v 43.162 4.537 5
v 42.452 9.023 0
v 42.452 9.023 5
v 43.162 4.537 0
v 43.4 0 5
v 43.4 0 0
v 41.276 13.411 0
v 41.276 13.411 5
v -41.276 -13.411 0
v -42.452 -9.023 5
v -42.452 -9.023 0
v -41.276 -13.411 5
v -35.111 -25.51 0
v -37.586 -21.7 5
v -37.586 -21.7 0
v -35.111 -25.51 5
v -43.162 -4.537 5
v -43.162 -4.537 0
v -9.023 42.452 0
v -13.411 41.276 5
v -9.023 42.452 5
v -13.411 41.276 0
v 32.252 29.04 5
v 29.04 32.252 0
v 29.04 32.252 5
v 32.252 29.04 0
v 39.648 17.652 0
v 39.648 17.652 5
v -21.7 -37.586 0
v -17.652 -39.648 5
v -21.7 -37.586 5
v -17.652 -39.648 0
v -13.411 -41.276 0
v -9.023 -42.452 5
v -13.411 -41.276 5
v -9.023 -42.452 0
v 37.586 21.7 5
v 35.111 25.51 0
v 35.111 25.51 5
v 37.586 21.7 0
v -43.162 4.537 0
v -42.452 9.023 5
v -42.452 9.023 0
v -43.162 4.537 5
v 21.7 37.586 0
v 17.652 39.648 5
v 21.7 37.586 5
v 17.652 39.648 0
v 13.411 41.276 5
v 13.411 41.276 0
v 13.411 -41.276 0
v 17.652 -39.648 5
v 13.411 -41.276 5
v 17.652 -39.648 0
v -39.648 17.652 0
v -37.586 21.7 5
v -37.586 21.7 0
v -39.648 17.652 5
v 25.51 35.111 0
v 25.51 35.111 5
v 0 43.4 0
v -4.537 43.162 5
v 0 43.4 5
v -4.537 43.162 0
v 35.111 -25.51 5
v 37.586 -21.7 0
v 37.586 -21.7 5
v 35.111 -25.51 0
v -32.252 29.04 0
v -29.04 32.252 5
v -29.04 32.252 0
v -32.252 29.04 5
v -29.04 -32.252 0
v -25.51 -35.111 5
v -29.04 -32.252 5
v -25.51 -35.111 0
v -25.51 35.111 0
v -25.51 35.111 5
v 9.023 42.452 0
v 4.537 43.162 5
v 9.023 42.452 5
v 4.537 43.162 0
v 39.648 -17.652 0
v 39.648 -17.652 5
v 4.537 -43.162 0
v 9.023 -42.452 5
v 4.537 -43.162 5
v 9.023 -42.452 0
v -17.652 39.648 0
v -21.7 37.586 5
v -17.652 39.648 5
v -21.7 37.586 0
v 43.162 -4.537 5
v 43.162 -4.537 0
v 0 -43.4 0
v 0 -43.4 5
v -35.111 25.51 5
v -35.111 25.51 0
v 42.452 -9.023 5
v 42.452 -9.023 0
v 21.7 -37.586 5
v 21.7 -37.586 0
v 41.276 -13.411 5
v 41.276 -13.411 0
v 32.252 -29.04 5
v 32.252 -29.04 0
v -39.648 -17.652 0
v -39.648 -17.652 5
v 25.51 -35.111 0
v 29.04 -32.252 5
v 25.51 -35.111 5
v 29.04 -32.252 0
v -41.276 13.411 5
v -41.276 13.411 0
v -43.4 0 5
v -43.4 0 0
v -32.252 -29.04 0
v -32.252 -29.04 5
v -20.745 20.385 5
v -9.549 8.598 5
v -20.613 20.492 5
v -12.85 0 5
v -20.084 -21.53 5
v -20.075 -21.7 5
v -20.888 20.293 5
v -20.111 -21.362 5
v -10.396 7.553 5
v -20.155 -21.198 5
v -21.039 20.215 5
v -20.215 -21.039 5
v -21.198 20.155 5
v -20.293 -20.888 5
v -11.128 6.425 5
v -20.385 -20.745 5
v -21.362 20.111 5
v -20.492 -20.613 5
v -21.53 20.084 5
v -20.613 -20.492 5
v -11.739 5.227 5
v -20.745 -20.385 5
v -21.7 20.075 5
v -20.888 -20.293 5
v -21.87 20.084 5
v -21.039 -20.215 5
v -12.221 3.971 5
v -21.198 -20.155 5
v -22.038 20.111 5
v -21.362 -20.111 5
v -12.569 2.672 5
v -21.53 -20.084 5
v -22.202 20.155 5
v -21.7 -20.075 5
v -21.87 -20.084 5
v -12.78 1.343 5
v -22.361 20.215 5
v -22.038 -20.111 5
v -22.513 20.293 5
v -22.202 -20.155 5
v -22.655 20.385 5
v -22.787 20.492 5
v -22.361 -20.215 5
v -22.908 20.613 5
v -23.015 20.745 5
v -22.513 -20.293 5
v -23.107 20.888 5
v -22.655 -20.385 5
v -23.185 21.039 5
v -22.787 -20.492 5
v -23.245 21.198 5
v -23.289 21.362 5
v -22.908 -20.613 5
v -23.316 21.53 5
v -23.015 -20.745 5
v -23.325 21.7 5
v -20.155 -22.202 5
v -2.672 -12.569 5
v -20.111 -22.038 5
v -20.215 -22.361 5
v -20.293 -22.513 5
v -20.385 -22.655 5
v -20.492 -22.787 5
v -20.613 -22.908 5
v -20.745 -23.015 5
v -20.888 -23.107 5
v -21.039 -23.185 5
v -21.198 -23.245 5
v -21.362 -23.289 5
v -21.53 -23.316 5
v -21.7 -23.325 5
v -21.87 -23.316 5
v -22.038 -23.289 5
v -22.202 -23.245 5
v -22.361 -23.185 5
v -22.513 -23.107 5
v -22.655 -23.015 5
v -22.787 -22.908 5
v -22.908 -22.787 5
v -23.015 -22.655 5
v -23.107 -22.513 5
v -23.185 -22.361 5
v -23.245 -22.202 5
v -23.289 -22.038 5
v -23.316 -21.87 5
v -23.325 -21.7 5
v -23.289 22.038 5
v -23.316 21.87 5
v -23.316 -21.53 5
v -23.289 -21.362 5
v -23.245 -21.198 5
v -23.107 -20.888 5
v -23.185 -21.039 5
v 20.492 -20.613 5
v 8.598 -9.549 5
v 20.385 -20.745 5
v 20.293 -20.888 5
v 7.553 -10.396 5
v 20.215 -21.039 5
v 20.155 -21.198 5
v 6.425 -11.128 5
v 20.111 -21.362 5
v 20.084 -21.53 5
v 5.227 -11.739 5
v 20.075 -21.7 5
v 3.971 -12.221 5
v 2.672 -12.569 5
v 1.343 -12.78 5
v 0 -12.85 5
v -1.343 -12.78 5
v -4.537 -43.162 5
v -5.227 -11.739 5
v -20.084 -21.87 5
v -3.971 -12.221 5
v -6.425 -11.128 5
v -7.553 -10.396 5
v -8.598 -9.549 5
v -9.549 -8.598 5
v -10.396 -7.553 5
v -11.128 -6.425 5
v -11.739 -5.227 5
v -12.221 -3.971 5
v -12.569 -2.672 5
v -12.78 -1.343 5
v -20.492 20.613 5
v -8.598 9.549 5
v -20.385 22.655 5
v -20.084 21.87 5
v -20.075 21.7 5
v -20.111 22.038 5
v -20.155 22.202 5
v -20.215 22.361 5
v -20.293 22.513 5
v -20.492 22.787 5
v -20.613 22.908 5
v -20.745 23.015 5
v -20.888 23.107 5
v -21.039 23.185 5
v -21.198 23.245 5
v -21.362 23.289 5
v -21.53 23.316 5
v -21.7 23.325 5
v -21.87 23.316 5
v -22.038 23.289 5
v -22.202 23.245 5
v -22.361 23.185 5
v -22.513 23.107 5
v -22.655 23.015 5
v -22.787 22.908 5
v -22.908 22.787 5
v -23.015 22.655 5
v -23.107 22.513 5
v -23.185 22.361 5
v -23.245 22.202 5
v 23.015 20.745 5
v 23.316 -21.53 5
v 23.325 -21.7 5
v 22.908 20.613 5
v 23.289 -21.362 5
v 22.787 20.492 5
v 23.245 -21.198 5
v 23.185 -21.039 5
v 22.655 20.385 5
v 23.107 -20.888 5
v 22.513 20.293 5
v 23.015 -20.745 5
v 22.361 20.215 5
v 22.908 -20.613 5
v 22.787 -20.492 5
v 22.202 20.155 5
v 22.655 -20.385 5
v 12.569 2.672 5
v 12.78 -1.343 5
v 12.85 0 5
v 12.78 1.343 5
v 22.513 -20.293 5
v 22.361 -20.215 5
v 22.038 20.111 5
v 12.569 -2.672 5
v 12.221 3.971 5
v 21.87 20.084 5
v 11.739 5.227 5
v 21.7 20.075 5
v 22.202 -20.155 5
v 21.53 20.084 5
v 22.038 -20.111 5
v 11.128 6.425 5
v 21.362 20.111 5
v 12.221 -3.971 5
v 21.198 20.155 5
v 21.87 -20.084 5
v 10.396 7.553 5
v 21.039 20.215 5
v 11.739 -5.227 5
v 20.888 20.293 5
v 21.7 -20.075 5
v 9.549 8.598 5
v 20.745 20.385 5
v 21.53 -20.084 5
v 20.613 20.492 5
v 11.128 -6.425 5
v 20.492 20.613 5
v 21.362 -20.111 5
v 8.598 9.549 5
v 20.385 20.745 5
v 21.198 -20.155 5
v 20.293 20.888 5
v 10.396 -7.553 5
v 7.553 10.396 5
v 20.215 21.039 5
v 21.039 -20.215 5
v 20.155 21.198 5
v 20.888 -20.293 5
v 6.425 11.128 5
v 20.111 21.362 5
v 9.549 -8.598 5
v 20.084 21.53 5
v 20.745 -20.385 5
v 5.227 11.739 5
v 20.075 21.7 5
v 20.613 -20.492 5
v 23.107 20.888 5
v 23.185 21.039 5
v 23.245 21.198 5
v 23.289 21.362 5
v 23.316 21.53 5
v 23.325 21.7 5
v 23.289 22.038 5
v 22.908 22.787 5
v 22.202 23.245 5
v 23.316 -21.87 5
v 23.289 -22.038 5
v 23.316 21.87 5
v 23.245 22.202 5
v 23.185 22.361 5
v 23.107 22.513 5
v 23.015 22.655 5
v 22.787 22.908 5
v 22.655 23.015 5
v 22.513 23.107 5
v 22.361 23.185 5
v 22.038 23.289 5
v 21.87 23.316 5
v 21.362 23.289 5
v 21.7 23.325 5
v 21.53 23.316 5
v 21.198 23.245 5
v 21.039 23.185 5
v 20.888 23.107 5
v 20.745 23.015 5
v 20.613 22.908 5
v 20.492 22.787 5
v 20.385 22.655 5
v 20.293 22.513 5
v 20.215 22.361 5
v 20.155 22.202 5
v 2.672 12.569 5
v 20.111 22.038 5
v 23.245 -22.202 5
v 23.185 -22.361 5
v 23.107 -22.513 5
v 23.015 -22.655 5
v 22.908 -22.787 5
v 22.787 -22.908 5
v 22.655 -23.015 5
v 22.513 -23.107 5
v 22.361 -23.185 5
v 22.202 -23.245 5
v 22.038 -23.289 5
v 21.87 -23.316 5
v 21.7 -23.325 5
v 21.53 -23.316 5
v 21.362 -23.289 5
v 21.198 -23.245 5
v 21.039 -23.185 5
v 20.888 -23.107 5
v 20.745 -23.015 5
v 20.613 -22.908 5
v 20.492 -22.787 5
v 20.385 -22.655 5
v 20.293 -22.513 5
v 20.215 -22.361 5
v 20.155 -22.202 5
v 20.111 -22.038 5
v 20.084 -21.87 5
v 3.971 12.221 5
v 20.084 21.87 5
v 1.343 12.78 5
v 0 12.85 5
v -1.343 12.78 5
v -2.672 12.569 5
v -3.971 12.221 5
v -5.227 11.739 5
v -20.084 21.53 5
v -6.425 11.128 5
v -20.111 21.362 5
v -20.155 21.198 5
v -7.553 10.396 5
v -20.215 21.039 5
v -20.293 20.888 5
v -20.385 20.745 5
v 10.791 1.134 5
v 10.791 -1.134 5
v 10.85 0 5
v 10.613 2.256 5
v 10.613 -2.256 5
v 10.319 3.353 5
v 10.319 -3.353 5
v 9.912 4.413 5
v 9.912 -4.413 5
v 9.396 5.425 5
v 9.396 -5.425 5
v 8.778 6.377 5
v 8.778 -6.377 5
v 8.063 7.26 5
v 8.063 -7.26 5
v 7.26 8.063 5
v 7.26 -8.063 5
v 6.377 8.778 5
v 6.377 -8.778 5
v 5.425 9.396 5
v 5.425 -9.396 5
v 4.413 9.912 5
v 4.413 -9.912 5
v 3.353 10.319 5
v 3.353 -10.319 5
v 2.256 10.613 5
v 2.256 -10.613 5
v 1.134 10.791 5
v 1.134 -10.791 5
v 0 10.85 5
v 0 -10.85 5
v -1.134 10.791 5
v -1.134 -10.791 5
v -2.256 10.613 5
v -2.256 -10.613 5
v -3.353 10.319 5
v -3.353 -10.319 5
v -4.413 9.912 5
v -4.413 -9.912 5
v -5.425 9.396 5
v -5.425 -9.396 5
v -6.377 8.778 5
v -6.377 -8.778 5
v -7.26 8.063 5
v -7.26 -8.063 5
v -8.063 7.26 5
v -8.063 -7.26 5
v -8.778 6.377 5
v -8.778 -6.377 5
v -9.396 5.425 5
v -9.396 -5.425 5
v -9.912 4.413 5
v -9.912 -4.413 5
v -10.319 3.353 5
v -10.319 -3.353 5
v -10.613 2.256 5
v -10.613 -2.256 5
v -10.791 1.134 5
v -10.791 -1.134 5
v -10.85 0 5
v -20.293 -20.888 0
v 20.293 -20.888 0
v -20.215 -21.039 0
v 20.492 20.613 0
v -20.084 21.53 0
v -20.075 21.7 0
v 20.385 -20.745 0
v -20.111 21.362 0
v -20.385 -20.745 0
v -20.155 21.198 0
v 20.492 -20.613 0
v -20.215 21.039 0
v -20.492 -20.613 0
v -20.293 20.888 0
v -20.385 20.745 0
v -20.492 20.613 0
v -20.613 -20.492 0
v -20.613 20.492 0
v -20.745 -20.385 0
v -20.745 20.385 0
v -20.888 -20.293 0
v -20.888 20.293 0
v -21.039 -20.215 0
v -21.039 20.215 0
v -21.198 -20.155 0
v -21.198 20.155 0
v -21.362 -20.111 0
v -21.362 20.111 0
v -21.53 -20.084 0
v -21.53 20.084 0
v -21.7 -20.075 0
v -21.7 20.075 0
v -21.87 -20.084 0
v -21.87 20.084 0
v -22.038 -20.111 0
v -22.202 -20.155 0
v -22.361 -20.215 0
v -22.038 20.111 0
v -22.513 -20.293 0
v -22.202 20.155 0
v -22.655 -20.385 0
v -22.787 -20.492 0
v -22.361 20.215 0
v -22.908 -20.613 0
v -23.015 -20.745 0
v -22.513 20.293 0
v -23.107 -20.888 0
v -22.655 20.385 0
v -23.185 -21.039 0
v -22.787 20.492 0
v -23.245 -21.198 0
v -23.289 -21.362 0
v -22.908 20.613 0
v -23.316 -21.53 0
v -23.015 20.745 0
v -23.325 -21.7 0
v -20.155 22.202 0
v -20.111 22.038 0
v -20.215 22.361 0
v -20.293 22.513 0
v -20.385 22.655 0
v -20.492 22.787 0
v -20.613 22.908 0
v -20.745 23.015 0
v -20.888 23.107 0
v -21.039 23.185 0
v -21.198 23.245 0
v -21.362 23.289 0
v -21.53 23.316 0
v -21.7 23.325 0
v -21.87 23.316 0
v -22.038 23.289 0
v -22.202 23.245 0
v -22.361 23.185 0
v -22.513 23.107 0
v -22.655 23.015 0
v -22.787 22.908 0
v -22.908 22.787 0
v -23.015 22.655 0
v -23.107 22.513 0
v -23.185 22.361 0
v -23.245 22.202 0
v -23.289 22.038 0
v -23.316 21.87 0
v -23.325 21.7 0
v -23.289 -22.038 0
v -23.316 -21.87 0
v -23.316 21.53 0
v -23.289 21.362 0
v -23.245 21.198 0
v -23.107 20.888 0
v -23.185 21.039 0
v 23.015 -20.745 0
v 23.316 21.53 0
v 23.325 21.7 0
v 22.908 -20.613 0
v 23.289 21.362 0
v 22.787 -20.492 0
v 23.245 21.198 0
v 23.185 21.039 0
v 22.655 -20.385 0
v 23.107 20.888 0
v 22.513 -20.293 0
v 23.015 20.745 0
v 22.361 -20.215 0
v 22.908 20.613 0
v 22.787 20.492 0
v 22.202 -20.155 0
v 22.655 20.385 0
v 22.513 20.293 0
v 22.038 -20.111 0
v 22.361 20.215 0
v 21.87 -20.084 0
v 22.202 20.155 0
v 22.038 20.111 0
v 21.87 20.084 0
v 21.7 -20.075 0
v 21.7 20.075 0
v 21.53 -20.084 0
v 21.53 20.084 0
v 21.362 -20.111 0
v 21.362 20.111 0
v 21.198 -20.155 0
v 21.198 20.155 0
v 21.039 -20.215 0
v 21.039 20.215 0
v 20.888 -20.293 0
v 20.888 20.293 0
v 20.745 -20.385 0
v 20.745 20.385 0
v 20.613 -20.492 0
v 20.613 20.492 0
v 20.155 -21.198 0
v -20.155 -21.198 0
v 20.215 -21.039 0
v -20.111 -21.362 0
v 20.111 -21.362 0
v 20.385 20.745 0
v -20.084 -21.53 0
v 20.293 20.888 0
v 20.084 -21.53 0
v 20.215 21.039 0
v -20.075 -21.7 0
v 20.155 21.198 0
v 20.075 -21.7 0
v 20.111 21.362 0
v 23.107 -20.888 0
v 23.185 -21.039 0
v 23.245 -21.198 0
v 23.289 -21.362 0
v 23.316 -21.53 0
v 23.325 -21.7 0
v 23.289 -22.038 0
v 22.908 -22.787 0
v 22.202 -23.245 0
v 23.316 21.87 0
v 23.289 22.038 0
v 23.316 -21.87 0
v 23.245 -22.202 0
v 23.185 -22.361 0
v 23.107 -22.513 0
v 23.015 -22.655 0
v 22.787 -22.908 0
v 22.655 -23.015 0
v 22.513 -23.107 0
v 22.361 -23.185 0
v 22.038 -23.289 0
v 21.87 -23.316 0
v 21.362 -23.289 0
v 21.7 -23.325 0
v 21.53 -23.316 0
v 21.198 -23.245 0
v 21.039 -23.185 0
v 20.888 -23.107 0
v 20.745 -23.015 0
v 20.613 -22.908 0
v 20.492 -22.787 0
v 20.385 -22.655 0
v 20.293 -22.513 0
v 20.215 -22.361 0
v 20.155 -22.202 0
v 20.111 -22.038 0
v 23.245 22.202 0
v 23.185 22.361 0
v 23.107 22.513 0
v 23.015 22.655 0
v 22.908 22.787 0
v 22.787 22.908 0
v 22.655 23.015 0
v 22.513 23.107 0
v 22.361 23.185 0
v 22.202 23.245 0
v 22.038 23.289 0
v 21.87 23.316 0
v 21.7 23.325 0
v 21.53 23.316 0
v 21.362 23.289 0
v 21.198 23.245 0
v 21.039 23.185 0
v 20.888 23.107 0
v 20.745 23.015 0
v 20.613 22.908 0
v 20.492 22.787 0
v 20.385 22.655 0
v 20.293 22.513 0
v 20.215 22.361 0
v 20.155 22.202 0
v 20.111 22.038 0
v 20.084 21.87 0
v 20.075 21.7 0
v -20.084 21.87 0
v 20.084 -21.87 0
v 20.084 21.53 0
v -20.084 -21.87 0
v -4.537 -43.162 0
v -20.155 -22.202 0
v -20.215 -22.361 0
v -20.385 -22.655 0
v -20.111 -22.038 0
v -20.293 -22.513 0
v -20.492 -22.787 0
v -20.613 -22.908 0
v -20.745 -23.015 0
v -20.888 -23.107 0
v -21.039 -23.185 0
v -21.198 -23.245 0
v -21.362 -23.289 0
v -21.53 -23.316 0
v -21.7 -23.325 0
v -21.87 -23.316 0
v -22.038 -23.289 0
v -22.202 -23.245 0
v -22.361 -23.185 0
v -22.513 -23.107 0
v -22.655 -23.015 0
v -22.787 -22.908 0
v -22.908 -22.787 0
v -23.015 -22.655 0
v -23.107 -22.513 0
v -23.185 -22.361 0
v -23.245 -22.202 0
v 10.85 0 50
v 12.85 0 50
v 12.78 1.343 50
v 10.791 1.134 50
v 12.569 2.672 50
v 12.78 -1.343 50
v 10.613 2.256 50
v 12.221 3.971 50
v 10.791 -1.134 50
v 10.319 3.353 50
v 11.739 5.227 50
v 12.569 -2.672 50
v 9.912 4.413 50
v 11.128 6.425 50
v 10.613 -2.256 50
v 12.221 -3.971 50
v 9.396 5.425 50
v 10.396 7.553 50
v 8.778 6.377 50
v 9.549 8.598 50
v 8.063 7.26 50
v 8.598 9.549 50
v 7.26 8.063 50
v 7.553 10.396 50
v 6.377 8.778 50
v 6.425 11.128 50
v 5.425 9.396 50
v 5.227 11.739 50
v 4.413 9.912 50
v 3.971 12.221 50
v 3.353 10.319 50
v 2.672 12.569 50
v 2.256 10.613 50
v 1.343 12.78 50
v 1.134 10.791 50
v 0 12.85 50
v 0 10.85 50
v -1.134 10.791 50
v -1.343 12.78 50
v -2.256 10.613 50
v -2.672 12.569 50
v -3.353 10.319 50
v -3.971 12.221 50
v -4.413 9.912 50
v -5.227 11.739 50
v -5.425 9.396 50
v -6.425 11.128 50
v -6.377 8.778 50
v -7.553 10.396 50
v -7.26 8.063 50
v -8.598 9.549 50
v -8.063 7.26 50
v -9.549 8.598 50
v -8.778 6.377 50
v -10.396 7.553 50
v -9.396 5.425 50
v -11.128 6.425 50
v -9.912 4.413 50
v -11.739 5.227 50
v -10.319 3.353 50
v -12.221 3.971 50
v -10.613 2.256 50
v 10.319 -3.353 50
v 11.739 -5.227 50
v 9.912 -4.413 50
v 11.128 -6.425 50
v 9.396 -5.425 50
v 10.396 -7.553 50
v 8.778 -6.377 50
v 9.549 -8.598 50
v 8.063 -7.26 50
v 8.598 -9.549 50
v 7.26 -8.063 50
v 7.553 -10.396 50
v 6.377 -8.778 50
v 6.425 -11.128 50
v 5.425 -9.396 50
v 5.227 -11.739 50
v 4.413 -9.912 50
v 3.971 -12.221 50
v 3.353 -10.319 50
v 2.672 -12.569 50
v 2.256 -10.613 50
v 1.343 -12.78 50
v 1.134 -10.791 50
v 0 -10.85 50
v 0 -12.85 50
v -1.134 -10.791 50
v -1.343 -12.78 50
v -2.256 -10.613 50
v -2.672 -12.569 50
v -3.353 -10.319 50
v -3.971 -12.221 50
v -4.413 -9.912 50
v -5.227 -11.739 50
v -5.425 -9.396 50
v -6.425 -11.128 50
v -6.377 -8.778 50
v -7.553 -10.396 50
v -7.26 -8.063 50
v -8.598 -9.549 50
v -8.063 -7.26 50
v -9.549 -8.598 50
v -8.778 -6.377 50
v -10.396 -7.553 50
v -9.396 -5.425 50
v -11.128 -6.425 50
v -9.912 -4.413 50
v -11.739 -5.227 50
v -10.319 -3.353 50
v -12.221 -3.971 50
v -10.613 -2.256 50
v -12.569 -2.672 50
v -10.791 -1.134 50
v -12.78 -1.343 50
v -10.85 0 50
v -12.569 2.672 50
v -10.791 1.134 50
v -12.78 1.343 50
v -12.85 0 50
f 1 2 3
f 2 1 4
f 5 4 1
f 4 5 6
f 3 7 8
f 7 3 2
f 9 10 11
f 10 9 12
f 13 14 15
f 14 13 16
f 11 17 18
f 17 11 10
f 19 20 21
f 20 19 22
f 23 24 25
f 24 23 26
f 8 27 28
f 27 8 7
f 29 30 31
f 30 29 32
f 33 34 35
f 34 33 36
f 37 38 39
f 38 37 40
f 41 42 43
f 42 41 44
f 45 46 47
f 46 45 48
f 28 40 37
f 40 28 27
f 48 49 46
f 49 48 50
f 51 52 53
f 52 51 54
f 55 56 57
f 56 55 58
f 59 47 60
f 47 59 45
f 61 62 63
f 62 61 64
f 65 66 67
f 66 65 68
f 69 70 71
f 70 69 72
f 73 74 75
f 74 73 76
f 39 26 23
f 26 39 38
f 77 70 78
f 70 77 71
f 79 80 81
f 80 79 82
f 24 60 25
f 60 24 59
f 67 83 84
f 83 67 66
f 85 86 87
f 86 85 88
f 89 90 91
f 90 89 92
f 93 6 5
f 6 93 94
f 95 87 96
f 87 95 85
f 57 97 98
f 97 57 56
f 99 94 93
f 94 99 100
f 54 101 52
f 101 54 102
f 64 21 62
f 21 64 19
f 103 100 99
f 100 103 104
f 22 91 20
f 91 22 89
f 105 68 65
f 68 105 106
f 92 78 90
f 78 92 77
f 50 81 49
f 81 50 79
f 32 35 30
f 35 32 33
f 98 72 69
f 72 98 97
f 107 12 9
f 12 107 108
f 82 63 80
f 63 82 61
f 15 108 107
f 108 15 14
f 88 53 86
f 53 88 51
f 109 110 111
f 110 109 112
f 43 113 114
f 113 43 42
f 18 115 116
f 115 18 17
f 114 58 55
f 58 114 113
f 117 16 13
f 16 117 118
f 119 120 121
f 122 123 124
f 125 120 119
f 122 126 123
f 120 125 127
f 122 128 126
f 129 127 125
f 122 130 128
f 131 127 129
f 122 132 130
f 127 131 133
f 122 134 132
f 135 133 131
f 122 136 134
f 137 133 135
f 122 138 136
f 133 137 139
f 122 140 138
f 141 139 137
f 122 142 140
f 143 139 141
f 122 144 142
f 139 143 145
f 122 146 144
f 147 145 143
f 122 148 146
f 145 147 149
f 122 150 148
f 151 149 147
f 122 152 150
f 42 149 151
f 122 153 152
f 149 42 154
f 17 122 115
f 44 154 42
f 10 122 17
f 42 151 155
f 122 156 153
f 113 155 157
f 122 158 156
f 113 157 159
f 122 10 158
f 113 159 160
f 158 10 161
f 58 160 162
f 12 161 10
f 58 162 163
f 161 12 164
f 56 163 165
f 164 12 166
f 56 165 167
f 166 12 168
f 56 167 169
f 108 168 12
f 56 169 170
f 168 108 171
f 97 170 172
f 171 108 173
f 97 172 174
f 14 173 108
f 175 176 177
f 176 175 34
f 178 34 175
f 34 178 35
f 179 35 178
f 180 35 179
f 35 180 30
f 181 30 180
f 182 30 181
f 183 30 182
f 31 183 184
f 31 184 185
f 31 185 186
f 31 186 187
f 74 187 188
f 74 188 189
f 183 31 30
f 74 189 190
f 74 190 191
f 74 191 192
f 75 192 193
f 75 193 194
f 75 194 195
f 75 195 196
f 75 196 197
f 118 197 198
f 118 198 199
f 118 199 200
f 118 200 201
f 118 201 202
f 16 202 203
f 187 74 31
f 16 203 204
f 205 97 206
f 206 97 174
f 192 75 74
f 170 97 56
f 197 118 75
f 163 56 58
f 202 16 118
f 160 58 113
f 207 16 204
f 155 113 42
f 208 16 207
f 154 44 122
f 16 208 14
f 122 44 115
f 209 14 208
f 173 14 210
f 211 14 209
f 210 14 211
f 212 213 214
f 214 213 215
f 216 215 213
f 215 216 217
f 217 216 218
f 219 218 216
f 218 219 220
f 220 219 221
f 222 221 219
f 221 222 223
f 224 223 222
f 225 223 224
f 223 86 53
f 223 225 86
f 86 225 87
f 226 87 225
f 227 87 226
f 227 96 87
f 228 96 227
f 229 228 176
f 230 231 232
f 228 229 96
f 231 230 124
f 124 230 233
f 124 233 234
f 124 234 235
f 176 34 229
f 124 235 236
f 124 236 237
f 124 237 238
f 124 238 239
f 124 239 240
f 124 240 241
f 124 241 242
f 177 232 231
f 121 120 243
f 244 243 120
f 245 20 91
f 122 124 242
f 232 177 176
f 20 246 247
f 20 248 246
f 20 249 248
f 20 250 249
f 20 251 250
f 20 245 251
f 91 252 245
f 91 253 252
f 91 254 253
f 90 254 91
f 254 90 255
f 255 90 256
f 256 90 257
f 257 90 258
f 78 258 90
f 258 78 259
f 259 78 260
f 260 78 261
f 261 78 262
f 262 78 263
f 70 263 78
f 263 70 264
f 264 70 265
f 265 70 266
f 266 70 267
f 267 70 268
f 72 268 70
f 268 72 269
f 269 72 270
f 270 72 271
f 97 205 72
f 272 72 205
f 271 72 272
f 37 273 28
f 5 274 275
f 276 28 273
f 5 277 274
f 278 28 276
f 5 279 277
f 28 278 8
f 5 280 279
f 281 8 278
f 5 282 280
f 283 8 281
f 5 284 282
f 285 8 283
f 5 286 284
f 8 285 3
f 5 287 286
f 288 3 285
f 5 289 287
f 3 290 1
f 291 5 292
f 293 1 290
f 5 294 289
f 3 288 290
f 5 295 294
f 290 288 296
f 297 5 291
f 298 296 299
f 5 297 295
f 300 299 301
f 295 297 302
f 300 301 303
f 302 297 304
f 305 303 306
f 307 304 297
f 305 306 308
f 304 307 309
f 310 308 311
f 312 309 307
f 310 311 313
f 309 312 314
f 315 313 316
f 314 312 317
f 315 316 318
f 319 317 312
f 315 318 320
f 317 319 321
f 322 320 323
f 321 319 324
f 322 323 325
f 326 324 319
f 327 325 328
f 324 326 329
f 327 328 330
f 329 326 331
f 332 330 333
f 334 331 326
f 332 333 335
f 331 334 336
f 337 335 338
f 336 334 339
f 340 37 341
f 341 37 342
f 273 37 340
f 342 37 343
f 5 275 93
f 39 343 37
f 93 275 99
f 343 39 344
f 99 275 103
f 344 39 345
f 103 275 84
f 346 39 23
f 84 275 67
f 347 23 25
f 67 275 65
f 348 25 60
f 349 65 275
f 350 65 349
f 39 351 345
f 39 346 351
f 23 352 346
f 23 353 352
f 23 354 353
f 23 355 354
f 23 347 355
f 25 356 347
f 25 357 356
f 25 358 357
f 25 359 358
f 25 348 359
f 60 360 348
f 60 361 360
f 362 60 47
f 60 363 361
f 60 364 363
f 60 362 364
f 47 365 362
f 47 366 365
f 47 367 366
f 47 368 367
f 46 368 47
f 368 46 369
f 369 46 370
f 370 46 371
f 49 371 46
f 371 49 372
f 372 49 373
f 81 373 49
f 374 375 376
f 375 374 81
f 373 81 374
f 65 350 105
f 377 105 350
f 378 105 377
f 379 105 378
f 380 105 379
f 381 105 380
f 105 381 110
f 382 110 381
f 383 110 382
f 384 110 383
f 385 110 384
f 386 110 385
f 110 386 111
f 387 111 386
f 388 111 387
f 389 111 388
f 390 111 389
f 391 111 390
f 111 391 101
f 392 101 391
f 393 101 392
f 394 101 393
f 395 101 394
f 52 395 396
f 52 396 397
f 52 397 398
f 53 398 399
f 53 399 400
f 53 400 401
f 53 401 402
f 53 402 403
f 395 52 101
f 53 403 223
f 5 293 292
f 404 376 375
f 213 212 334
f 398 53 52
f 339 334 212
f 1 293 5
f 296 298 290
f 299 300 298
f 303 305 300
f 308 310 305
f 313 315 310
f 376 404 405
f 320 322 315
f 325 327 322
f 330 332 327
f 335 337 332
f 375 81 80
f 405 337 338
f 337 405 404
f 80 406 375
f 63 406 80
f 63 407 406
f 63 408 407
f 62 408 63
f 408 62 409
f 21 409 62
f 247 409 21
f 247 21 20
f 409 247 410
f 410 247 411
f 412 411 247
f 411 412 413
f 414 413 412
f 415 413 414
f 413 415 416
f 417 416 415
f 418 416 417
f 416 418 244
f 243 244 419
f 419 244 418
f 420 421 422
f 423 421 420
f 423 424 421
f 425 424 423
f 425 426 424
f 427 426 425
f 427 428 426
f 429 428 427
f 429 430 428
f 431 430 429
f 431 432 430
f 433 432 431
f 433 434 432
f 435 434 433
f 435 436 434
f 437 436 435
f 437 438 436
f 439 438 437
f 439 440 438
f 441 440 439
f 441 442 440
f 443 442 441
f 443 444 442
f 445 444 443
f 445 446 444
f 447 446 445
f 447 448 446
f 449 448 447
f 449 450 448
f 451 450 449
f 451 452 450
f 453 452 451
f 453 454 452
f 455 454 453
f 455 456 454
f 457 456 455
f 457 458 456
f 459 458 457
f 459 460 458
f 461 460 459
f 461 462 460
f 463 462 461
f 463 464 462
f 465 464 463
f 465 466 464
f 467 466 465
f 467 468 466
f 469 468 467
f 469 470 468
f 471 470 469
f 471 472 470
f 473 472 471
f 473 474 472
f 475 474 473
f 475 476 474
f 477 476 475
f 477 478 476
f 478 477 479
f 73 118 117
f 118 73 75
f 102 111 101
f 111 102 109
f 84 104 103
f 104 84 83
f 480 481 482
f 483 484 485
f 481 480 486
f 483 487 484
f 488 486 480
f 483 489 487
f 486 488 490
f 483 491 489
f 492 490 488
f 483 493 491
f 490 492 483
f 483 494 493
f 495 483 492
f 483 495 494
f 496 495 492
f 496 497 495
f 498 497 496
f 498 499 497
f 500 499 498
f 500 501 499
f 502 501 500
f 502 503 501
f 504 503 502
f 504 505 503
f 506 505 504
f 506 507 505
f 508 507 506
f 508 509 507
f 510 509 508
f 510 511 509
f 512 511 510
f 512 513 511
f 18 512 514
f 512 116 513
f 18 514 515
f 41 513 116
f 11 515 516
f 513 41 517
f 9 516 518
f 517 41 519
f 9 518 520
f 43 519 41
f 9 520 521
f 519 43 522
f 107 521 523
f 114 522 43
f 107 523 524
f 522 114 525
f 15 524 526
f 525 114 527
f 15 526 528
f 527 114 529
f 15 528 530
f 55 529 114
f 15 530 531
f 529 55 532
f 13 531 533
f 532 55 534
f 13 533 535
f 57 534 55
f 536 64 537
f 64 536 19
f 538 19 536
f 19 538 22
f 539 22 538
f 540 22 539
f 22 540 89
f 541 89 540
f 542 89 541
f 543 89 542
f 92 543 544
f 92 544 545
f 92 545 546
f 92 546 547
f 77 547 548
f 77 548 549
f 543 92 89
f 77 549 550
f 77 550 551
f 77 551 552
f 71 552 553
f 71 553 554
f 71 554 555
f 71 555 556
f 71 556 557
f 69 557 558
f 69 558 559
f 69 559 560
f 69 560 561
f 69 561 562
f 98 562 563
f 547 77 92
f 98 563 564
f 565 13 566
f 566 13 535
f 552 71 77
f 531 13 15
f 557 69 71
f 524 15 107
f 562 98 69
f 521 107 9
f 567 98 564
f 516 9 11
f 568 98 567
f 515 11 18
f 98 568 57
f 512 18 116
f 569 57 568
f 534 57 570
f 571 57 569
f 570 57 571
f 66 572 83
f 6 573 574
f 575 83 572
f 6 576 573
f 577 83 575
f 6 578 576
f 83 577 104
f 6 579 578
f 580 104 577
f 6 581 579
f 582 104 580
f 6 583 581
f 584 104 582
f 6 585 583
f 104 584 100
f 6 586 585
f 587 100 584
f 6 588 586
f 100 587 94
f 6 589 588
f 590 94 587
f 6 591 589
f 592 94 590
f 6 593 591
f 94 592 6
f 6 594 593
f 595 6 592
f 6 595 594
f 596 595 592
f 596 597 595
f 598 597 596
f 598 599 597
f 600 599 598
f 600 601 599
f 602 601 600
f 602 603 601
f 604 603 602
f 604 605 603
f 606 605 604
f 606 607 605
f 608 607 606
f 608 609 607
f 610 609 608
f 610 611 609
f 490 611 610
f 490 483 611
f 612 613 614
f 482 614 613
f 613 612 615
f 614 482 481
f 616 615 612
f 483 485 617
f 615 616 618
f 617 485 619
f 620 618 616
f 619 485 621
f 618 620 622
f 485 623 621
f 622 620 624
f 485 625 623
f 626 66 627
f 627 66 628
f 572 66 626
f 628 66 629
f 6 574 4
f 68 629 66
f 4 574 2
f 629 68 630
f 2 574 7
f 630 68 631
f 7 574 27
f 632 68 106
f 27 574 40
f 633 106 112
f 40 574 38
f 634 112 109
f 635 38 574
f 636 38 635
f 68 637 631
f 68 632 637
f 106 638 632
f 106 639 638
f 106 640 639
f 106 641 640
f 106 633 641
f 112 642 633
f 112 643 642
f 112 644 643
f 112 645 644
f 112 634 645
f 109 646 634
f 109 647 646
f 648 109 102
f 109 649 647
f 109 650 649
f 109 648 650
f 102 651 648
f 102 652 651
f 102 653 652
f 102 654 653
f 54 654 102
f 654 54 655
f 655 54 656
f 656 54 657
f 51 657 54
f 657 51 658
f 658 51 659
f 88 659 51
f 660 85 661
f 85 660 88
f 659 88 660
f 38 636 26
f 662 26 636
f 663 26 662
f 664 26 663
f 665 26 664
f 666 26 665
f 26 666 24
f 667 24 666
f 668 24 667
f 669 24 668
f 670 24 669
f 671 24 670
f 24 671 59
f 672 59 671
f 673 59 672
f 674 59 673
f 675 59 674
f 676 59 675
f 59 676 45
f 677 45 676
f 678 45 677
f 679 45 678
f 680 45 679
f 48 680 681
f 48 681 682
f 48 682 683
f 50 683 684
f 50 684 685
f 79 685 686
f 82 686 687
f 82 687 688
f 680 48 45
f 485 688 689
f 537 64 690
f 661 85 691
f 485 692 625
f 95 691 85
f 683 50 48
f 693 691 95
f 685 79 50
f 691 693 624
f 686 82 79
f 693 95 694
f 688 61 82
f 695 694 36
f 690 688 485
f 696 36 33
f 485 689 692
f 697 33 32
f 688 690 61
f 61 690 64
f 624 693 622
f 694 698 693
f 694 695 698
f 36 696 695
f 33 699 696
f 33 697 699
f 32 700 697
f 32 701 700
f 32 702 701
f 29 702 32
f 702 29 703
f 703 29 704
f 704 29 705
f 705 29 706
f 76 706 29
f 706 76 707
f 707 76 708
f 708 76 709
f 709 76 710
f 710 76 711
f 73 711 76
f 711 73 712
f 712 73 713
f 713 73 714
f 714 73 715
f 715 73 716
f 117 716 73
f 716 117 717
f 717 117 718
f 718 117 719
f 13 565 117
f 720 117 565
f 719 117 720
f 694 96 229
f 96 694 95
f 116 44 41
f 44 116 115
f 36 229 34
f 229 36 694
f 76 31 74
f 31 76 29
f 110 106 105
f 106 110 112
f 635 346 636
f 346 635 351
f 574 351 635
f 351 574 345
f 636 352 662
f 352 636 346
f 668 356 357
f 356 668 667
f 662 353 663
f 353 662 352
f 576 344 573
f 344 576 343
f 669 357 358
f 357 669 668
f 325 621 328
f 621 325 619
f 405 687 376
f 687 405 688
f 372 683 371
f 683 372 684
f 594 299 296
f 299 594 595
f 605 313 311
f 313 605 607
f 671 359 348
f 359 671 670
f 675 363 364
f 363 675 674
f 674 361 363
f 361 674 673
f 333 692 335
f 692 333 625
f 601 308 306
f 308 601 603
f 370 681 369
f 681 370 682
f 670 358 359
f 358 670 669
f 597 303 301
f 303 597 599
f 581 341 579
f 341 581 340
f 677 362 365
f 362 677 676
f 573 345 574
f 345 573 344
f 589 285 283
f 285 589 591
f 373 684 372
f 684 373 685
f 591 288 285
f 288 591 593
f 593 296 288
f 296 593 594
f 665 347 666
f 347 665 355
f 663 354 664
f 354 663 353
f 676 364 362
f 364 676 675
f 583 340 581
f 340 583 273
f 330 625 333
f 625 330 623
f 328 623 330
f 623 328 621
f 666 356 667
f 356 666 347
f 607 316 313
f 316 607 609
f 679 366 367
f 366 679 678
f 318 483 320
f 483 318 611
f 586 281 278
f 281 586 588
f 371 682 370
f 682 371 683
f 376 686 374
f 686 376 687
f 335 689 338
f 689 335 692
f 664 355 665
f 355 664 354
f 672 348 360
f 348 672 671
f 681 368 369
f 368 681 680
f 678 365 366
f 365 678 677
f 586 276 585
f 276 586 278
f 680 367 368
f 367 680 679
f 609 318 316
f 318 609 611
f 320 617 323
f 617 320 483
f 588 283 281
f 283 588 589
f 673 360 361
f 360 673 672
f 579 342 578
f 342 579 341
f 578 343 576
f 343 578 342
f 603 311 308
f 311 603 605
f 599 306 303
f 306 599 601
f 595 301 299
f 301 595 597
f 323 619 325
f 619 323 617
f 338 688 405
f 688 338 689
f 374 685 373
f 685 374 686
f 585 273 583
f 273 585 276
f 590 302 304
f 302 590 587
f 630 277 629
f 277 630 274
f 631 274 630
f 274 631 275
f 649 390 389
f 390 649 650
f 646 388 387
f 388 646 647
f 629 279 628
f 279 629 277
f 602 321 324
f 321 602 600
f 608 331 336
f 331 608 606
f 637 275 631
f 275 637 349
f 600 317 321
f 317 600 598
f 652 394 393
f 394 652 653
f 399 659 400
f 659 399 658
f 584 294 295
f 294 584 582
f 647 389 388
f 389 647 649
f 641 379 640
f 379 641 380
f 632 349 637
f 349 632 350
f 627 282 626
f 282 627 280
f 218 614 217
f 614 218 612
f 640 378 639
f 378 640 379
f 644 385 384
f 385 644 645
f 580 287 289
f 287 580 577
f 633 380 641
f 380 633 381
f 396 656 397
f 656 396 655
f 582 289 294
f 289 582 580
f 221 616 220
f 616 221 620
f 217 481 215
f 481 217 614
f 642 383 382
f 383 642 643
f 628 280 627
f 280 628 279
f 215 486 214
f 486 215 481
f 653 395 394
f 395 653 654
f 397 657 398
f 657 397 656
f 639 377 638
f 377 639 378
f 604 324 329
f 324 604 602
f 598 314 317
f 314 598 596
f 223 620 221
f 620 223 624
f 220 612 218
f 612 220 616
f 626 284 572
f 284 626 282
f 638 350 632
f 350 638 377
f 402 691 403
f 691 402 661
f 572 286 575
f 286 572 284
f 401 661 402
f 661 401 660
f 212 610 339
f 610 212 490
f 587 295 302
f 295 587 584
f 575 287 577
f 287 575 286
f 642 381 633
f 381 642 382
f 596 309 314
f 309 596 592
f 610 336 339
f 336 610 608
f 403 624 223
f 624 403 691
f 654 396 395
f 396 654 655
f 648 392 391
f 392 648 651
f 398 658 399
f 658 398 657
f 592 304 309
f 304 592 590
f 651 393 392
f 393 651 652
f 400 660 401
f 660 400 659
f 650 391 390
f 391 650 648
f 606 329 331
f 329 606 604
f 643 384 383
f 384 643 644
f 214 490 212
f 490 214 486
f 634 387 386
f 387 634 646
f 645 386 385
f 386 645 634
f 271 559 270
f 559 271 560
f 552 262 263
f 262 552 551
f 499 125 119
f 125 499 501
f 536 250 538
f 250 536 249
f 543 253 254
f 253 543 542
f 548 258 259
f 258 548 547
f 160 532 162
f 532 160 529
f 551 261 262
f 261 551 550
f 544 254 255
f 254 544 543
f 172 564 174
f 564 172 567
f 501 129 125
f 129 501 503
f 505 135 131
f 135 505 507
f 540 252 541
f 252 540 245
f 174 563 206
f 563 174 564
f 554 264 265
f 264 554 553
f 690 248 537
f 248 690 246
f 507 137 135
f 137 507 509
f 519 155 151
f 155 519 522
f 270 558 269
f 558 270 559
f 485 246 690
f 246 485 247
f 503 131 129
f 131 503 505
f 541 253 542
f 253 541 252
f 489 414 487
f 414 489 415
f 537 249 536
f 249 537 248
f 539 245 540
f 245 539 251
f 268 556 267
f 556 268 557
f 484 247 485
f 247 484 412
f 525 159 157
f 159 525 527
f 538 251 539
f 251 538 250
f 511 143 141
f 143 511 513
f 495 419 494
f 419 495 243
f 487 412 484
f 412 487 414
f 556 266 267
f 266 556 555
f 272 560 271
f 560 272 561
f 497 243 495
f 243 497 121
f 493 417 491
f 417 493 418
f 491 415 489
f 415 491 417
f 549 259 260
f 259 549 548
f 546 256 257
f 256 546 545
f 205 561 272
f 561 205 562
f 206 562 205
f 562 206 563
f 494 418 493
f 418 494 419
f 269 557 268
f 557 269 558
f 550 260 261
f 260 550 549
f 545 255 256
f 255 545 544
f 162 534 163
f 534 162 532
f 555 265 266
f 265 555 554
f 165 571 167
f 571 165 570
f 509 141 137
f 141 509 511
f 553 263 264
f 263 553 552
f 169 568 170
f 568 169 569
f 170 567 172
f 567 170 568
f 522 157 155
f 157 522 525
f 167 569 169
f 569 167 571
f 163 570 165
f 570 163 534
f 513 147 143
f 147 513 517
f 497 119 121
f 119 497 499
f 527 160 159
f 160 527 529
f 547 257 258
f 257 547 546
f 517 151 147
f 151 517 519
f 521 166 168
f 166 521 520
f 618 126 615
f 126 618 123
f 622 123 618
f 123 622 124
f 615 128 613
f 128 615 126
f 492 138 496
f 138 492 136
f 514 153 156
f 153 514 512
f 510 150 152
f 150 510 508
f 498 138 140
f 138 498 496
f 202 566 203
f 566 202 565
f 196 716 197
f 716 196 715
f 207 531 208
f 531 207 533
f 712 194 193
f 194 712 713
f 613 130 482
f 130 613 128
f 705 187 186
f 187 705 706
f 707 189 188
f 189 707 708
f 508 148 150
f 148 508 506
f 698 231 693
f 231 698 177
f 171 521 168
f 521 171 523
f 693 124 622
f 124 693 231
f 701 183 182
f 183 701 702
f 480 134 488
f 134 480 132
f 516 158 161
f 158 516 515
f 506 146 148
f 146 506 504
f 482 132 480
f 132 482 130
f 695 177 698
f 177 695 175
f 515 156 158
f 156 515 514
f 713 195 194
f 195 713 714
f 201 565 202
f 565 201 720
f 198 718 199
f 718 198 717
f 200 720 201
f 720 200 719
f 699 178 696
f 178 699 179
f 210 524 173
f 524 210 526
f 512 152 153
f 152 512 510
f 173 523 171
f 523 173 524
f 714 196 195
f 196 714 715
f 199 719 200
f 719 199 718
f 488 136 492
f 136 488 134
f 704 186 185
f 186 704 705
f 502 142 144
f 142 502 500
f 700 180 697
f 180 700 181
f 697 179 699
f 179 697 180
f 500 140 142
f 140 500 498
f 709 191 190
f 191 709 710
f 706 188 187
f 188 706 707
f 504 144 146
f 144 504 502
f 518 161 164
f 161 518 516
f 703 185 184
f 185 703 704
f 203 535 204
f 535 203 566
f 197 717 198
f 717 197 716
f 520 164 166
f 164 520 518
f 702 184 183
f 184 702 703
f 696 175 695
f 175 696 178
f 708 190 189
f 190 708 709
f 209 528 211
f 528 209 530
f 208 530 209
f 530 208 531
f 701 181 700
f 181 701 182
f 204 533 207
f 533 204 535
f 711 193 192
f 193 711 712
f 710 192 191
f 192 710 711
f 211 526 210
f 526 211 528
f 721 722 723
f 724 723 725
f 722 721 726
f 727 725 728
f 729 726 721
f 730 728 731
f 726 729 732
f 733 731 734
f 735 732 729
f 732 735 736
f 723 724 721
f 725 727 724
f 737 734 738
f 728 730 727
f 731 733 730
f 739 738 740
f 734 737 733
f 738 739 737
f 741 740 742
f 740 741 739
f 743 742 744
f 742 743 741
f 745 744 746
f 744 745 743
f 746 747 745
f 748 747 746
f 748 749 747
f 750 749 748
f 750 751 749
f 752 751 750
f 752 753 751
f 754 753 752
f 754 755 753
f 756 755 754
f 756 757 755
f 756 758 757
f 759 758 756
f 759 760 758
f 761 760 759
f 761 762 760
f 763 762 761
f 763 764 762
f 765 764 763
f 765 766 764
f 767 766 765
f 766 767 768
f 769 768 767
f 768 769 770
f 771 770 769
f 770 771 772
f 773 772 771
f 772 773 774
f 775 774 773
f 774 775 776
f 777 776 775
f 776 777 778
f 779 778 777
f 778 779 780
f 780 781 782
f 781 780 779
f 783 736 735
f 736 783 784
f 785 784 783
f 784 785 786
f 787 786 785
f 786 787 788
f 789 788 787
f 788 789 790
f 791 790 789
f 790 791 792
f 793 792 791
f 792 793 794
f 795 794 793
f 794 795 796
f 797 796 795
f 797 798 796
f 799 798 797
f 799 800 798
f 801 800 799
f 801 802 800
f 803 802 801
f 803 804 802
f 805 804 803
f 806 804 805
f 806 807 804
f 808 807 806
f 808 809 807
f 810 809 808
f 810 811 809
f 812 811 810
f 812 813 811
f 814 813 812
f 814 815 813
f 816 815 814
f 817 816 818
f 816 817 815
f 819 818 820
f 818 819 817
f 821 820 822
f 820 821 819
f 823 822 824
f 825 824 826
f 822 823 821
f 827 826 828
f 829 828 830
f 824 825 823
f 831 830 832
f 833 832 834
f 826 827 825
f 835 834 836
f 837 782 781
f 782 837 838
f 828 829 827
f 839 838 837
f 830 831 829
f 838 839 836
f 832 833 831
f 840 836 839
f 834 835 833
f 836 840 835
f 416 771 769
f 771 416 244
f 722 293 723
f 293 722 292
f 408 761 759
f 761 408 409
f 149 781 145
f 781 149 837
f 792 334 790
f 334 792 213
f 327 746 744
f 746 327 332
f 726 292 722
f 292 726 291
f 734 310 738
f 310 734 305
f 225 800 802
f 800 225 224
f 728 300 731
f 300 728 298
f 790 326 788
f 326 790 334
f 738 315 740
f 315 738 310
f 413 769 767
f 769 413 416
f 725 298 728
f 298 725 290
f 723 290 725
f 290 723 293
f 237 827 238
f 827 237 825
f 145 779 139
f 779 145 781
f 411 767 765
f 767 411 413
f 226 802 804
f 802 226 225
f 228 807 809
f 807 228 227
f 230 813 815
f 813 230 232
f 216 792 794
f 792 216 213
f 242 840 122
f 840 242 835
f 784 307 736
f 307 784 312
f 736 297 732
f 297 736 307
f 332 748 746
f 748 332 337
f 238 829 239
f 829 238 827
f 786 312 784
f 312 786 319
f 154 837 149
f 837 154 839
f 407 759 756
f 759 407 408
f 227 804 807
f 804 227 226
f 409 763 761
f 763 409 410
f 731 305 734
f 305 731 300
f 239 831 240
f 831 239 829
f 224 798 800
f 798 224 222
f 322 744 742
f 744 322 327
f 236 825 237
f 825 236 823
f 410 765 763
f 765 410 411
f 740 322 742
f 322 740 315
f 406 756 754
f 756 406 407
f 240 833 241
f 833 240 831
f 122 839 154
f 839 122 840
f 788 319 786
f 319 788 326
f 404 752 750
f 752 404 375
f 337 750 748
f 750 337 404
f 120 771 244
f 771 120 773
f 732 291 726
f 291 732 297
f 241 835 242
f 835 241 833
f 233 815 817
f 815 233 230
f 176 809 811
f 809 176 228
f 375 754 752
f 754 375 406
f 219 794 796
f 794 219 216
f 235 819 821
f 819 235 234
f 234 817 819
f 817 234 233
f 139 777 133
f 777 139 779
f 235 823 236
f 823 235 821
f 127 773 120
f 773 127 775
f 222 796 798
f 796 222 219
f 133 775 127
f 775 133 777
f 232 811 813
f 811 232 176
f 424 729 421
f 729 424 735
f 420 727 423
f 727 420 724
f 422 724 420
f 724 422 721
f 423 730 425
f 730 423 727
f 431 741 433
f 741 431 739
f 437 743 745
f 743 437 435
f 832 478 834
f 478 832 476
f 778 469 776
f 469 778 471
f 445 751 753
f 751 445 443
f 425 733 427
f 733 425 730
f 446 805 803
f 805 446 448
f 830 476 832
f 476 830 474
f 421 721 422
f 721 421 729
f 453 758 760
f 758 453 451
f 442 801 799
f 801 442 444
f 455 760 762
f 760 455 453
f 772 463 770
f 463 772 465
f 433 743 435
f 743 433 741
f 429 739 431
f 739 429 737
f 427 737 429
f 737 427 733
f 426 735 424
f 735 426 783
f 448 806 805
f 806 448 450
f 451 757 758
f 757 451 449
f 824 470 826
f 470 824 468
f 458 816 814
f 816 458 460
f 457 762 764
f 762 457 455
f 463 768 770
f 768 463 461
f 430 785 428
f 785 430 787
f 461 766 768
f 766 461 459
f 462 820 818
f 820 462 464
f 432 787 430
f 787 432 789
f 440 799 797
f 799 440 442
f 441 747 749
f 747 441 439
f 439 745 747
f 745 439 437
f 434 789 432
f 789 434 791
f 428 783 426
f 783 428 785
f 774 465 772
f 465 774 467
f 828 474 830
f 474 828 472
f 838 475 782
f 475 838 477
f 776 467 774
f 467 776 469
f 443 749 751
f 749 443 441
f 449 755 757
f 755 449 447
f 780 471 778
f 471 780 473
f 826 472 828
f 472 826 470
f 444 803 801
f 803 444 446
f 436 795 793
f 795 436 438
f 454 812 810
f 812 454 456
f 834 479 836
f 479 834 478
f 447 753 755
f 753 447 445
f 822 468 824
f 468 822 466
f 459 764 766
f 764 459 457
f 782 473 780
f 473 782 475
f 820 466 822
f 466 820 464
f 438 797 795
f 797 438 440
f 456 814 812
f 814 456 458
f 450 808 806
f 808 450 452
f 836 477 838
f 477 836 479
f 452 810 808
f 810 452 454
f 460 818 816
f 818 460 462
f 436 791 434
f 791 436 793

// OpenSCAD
pipe_d = 21.7;
base_thick = 5;

$fn=60;

difference() {
  cylinder(d=pipe_d*4, h=base_thick);
  translate([pipe_d,pipe_d,0]) cylinder(d=3.25,h=base_thick+0.2);
  translate([pipe_d,-pipe_d,0]) cylinder(d=3.25,h=base_thick+0.2);
  translate([-pipe_d,pipe_d,0]) cylinder(d=3.25,h=base_thick+0.2);
  translate([-pipe_d,-pipe_d,0]) cylinder(d=3.25,h=base_thick+0.2);
}

// translate([0,0,base_thick-0.1]) 
difference() {
  cylinder(d=pipe_d+4, h=50);
  translate([0,0,-0.1]) cylinder(d=pipe_d, h=50.2);
}
